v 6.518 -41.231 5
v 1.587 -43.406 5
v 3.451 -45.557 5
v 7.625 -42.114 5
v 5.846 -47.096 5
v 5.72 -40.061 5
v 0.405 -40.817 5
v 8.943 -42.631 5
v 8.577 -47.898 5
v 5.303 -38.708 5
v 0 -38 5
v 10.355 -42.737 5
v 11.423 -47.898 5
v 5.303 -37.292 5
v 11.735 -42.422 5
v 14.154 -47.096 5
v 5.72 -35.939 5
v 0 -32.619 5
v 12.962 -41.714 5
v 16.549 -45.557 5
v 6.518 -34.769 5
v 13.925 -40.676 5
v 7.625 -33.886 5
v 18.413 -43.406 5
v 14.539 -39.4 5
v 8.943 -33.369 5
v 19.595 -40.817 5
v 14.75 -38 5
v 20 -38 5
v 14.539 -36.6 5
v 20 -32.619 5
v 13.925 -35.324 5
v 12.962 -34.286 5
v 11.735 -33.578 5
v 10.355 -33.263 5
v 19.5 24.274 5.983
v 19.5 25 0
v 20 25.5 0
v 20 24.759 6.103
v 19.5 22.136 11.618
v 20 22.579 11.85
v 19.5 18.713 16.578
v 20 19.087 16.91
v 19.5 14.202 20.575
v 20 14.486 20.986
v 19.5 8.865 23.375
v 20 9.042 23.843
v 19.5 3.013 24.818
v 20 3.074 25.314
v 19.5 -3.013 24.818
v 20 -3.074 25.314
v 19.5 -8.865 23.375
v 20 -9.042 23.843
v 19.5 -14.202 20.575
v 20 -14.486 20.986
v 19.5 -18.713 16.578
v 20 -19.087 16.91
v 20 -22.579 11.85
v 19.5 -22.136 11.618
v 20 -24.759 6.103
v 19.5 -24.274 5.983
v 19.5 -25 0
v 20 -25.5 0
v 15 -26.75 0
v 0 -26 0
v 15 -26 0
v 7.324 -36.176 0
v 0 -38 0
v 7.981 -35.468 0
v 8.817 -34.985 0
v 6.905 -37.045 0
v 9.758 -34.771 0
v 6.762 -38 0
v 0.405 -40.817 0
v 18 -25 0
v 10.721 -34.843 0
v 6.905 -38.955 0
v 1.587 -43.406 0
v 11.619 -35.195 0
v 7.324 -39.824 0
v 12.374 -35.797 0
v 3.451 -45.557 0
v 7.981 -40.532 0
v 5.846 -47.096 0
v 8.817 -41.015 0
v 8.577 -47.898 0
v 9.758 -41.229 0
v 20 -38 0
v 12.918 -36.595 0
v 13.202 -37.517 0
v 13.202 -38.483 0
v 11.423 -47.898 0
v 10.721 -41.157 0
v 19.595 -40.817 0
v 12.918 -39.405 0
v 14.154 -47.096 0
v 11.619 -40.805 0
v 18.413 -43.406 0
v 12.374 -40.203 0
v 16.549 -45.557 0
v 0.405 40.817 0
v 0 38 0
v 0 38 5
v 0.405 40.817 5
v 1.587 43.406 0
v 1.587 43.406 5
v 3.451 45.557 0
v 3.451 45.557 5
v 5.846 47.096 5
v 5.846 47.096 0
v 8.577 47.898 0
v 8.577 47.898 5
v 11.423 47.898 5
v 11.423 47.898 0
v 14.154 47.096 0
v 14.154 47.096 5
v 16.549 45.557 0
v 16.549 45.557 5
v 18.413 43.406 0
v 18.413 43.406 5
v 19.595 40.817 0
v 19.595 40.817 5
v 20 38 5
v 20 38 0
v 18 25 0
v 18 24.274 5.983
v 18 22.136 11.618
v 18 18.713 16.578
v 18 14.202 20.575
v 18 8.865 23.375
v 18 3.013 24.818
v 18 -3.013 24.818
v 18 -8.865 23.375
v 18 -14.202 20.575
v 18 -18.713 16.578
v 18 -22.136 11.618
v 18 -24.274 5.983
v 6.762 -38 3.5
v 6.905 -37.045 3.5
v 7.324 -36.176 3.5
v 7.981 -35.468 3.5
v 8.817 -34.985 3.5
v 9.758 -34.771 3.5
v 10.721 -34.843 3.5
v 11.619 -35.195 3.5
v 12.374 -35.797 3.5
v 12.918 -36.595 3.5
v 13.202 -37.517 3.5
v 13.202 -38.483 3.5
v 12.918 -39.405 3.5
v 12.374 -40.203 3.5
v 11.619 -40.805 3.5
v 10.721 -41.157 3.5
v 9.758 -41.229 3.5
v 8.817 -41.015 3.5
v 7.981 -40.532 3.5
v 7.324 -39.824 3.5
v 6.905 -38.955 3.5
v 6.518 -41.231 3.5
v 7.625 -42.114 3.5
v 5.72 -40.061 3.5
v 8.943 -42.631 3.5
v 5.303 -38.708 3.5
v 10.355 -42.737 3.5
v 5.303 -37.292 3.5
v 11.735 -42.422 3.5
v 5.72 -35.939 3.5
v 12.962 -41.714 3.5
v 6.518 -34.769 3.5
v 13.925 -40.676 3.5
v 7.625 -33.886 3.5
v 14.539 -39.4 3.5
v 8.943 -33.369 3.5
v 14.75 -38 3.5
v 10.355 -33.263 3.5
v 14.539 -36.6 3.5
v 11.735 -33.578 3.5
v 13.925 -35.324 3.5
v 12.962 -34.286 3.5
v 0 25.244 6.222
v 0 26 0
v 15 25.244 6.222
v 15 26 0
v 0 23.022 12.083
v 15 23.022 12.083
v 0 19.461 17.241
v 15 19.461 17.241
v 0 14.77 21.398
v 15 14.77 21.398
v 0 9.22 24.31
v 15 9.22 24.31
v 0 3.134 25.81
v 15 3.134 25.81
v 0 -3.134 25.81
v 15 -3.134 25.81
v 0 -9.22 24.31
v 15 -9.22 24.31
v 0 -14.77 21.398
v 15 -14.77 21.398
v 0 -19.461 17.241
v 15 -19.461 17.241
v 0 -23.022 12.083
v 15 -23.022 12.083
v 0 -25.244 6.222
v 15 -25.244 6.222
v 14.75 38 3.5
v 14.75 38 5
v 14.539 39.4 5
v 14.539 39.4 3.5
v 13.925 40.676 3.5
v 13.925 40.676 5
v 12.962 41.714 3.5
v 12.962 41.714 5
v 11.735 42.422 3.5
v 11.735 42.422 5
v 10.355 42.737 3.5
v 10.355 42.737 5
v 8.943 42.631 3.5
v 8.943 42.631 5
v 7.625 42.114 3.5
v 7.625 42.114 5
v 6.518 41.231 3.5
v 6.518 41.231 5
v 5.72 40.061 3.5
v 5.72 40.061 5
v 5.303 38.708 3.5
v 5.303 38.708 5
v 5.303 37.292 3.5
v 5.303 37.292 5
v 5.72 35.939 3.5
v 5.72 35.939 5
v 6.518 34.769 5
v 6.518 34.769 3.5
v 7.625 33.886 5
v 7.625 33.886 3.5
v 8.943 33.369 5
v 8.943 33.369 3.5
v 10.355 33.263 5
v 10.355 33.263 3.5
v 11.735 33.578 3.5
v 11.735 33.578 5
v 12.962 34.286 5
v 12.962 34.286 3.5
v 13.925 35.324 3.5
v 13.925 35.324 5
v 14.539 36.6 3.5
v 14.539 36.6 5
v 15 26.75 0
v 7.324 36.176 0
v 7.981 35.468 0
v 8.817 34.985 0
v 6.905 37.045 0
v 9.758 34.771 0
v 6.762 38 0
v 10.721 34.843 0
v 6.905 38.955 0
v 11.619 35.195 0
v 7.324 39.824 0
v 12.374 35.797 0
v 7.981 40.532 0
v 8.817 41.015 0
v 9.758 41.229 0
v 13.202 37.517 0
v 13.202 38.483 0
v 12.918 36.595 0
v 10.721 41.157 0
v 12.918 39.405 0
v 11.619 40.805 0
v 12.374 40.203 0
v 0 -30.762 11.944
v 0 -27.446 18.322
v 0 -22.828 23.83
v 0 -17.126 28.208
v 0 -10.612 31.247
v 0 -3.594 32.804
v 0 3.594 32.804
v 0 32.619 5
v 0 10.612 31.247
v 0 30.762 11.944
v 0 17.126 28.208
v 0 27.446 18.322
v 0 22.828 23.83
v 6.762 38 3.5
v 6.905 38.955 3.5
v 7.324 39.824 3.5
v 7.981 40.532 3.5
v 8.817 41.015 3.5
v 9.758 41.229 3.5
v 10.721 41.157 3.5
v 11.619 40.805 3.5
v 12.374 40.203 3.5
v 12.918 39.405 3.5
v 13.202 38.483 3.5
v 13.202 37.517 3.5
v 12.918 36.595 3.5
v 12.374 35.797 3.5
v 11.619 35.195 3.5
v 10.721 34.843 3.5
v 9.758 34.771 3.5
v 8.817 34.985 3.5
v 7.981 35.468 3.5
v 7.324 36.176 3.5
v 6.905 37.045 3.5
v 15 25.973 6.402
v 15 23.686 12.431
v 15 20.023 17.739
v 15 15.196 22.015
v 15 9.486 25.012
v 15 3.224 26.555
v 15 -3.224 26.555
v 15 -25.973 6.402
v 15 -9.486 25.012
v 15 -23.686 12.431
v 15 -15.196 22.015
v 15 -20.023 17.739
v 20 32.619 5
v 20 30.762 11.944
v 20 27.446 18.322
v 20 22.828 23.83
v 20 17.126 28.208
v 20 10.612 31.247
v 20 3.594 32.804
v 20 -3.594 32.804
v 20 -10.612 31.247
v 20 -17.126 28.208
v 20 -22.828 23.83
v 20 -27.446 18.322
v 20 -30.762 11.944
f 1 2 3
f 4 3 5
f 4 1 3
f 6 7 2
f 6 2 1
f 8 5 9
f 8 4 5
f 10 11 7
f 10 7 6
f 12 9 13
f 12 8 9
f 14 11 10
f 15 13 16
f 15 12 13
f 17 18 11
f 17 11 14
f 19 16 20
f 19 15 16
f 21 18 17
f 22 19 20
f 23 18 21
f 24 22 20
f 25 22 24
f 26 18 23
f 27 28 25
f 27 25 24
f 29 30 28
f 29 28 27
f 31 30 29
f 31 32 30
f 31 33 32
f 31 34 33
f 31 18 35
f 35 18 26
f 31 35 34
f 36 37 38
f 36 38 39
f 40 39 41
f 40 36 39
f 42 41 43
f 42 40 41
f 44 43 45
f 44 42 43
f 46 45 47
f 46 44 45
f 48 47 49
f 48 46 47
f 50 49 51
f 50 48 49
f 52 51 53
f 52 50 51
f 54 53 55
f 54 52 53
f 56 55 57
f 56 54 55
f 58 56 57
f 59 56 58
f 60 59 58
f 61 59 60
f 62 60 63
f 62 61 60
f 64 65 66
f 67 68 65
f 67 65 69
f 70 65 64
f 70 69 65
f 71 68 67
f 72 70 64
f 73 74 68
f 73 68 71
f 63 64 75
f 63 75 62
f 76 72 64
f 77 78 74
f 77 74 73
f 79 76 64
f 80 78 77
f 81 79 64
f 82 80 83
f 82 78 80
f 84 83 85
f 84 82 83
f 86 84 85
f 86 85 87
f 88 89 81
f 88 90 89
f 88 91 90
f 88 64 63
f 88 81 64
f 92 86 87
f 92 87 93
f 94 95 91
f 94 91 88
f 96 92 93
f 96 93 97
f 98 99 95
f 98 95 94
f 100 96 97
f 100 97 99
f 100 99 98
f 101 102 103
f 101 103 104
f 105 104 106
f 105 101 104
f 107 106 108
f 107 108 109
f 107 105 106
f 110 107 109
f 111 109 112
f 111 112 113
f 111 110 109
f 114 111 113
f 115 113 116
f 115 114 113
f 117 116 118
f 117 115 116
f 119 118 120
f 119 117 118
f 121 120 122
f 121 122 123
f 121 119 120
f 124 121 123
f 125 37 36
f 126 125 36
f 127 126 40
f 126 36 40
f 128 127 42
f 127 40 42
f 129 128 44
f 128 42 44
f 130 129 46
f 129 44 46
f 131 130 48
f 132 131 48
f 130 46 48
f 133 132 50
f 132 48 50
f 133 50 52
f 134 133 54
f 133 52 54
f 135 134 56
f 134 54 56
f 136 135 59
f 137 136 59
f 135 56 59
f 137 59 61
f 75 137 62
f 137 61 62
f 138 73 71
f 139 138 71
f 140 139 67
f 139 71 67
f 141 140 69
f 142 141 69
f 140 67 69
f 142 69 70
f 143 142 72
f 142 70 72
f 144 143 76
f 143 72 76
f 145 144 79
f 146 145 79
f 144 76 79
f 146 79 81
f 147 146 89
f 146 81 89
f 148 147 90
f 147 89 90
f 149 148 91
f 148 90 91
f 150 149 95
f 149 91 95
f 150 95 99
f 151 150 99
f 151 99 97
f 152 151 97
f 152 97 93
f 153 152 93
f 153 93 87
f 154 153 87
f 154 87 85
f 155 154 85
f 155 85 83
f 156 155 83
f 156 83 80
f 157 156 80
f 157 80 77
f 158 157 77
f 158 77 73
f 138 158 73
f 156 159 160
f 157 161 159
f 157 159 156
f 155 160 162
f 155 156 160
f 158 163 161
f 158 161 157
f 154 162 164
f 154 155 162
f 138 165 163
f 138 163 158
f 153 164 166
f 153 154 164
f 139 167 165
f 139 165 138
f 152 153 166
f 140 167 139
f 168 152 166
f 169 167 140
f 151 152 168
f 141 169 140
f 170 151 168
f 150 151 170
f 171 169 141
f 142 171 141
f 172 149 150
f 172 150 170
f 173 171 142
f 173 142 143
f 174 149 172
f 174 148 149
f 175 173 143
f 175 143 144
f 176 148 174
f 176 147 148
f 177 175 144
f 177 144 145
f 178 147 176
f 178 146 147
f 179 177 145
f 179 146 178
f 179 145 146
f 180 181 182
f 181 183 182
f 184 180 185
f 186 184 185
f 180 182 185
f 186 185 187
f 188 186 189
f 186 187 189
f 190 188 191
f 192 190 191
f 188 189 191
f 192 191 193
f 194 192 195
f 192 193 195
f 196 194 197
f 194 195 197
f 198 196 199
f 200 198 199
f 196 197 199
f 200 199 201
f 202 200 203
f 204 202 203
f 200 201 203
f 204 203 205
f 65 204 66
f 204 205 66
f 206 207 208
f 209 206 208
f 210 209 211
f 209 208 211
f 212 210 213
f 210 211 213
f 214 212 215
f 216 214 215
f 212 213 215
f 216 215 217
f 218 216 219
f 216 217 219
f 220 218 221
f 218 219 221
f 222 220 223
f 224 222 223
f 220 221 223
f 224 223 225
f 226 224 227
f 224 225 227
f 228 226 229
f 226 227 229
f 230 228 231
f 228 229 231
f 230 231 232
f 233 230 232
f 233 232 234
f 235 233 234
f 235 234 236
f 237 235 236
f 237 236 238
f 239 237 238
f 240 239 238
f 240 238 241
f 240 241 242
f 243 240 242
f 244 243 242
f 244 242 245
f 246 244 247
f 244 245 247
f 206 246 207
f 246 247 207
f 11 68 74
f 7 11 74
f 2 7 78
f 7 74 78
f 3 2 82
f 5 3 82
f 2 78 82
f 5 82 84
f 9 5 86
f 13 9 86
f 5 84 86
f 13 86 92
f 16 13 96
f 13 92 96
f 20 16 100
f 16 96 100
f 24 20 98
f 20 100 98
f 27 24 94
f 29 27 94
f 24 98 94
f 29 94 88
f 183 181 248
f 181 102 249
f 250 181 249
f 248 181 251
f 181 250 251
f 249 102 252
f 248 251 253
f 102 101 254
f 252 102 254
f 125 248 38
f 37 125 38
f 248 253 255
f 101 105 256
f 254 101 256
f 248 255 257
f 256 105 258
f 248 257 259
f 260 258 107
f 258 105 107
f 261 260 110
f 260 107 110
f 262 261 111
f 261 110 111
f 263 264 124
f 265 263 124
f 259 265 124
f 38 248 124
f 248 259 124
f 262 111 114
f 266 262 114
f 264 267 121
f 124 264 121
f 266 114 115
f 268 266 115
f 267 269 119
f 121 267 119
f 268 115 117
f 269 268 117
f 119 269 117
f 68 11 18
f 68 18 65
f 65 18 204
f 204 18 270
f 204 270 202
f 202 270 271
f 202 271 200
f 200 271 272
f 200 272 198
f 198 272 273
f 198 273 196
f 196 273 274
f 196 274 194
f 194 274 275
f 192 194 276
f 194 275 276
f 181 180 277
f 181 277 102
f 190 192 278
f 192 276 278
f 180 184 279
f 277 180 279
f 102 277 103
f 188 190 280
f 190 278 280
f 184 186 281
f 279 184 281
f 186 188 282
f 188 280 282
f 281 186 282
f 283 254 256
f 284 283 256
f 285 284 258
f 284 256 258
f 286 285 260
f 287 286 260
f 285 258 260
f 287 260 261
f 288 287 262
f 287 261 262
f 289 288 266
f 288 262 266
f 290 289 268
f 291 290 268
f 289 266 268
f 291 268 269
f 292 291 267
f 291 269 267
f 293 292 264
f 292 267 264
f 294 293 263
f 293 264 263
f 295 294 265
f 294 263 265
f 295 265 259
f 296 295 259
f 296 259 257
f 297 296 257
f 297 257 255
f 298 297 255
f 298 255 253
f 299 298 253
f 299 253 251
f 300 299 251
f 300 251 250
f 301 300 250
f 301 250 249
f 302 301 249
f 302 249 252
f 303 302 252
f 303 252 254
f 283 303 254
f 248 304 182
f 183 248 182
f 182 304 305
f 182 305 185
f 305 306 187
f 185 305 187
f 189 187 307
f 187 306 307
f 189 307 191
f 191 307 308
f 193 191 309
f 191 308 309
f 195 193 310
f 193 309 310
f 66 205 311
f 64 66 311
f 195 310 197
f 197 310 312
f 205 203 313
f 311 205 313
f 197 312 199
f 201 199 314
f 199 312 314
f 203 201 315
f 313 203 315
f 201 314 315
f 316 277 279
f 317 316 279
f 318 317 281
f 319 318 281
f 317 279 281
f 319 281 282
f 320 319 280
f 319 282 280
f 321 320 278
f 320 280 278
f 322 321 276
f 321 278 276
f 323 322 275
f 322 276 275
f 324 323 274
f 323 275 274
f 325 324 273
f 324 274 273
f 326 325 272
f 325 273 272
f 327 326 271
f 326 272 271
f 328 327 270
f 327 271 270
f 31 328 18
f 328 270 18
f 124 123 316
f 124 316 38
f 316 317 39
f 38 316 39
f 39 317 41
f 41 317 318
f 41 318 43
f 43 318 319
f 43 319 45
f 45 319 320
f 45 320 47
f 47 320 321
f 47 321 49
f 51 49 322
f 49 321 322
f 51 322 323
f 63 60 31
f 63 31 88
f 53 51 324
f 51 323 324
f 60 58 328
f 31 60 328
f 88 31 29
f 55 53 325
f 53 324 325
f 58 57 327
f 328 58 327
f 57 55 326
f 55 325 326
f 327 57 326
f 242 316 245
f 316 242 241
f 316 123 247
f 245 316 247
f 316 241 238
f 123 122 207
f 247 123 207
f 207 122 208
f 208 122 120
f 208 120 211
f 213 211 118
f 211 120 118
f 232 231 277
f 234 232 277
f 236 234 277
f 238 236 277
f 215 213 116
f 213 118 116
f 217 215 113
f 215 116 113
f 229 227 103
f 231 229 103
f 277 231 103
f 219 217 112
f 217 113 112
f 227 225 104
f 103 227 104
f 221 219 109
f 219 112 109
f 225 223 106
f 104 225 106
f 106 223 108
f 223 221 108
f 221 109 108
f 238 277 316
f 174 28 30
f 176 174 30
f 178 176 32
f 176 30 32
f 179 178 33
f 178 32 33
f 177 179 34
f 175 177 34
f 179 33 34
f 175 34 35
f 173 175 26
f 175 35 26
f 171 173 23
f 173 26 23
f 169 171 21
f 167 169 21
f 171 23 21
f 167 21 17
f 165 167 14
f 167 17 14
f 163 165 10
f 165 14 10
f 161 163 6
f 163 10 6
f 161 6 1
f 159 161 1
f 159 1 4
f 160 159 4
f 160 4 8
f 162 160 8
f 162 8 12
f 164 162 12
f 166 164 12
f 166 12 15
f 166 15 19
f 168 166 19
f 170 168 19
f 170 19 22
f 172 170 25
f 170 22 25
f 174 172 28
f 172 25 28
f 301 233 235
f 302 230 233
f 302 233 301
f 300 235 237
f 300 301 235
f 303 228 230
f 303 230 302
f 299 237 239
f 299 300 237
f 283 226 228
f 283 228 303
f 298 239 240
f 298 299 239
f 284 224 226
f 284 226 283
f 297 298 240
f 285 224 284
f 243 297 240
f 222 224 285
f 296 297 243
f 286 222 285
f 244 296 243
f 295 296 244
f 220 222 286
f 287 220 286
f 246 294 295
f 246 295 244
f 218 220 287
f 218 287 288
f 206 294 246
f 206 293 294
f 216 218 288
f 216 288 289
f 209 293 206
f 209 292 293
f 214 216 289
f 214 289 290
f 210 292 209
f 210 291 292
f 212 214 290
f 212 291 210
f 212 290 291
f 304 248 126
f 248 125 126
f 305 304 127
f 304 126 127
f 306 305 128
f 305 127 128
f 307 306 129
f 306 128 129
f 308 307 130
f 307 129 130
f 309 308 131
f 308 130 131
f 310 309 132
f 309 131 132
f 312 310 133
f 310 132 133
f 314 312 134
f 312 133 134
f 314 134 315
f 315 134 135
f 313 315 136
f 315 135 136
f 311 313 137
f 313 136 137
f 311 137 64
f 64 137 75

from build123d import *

# Parameters (mm, degrees)
REVOLVE1_ANGLE      = 180
BOSS_EXTRUDE3_DEPTH = 5
BOSS_EXTRUDE4_DEPTH = 5
SKETCH17_R          = 3.2385
CUT_EXTRUDE1_DEPTH  = 34
SKETCH18_R          = 4.75
CUT_EXTRUDE2_DEPTH  = 1.5
CHAMFER1_SIZE       = 0.5


with BuildPart() as part:
    # Sketch1 → Revolve1 (revolve)
    with BuildSketch(Plane.XY):
        Polygon((15, 26), (15, 26.75), (18, 25), (20, 25), (20, 33), (0, 33), (0, 26), align=None)
    revolve(axis=Axis((0, 0, 0), (1, 0, 0)), revolution_arc=REVOLVE1_ANGLE)

    # Sketch9 → Boss-Extrude3 (add)
    with BuildSketch(Plane(origin=(0, 0, 0), x_dir=(-1, 0, 0), z_dir=(0, 0, -1))):
        with BuildLine():
            Line((-20, 29), (0, 29))
            Line((0, 29), (0, 38))
            ThreePointArc((0, 38), (-10, 48), (-20, 38))
            Line((-20, 38), (-20, 29))
        make_face()
    extrude(amount=-BOSS_EXTRUDE3_DEPTH)

    # Sketch11 → Boss-Extrude4 (add)
    with BuildSketch(Plane(origin=(0, 0, 0), x_dir=(-1, 0, 0), z_dir=(0, 0, -1))):
        with BuildLine():
            Line((-20, -29), (0, -29))
            Line((0, -29), (0, -38))
            ThreePointArc((0, -38), (-10, -48), (-20, -38))
            Line((-20, -38), (-20, -29))
        make_face()
    extrude(amount=-BOSS_EXTRUDE4_DEPTH)

    # Sketch17 → Cut-Extrude1 (cut, through all)
    with BuildSketch(Plane(origin=(0, 0, 0), x_dir=(-1, 0, 0), z_dir=(0, 0, -1))):
        with Locations((-10, 38)):
            Circle(SKETCH17_R)
        with Locations((-10, -38)):
            Circle(SKETCH17_R)
    extrude(amount=-CUT_EXTRUDE1_DEPTH, mode=Mode.SUBTRACT)

    # Sketch18 → Cut-Extrude2 (cut)
    with BuildSketch(Plane.XY.offset(5)):
        with Locations((10, -38)):
            Circle(SKETCH18_R)
        with Locations((10, 38)):
            Circle(SKETCH18_R)
    extrude(amount=-CUT_EXTRUDE2_DEPTH, mode=Mode.SUBTRACT)

    # Chamfer1
    chamfer1_edges = [part.edges().sort_by_distance(p)[0] for p in [
        (20, 0, 25),
    ]]
    chamfer(chamfer1_edges, length=CHAMFER1_SIZE)


solid = part.part
